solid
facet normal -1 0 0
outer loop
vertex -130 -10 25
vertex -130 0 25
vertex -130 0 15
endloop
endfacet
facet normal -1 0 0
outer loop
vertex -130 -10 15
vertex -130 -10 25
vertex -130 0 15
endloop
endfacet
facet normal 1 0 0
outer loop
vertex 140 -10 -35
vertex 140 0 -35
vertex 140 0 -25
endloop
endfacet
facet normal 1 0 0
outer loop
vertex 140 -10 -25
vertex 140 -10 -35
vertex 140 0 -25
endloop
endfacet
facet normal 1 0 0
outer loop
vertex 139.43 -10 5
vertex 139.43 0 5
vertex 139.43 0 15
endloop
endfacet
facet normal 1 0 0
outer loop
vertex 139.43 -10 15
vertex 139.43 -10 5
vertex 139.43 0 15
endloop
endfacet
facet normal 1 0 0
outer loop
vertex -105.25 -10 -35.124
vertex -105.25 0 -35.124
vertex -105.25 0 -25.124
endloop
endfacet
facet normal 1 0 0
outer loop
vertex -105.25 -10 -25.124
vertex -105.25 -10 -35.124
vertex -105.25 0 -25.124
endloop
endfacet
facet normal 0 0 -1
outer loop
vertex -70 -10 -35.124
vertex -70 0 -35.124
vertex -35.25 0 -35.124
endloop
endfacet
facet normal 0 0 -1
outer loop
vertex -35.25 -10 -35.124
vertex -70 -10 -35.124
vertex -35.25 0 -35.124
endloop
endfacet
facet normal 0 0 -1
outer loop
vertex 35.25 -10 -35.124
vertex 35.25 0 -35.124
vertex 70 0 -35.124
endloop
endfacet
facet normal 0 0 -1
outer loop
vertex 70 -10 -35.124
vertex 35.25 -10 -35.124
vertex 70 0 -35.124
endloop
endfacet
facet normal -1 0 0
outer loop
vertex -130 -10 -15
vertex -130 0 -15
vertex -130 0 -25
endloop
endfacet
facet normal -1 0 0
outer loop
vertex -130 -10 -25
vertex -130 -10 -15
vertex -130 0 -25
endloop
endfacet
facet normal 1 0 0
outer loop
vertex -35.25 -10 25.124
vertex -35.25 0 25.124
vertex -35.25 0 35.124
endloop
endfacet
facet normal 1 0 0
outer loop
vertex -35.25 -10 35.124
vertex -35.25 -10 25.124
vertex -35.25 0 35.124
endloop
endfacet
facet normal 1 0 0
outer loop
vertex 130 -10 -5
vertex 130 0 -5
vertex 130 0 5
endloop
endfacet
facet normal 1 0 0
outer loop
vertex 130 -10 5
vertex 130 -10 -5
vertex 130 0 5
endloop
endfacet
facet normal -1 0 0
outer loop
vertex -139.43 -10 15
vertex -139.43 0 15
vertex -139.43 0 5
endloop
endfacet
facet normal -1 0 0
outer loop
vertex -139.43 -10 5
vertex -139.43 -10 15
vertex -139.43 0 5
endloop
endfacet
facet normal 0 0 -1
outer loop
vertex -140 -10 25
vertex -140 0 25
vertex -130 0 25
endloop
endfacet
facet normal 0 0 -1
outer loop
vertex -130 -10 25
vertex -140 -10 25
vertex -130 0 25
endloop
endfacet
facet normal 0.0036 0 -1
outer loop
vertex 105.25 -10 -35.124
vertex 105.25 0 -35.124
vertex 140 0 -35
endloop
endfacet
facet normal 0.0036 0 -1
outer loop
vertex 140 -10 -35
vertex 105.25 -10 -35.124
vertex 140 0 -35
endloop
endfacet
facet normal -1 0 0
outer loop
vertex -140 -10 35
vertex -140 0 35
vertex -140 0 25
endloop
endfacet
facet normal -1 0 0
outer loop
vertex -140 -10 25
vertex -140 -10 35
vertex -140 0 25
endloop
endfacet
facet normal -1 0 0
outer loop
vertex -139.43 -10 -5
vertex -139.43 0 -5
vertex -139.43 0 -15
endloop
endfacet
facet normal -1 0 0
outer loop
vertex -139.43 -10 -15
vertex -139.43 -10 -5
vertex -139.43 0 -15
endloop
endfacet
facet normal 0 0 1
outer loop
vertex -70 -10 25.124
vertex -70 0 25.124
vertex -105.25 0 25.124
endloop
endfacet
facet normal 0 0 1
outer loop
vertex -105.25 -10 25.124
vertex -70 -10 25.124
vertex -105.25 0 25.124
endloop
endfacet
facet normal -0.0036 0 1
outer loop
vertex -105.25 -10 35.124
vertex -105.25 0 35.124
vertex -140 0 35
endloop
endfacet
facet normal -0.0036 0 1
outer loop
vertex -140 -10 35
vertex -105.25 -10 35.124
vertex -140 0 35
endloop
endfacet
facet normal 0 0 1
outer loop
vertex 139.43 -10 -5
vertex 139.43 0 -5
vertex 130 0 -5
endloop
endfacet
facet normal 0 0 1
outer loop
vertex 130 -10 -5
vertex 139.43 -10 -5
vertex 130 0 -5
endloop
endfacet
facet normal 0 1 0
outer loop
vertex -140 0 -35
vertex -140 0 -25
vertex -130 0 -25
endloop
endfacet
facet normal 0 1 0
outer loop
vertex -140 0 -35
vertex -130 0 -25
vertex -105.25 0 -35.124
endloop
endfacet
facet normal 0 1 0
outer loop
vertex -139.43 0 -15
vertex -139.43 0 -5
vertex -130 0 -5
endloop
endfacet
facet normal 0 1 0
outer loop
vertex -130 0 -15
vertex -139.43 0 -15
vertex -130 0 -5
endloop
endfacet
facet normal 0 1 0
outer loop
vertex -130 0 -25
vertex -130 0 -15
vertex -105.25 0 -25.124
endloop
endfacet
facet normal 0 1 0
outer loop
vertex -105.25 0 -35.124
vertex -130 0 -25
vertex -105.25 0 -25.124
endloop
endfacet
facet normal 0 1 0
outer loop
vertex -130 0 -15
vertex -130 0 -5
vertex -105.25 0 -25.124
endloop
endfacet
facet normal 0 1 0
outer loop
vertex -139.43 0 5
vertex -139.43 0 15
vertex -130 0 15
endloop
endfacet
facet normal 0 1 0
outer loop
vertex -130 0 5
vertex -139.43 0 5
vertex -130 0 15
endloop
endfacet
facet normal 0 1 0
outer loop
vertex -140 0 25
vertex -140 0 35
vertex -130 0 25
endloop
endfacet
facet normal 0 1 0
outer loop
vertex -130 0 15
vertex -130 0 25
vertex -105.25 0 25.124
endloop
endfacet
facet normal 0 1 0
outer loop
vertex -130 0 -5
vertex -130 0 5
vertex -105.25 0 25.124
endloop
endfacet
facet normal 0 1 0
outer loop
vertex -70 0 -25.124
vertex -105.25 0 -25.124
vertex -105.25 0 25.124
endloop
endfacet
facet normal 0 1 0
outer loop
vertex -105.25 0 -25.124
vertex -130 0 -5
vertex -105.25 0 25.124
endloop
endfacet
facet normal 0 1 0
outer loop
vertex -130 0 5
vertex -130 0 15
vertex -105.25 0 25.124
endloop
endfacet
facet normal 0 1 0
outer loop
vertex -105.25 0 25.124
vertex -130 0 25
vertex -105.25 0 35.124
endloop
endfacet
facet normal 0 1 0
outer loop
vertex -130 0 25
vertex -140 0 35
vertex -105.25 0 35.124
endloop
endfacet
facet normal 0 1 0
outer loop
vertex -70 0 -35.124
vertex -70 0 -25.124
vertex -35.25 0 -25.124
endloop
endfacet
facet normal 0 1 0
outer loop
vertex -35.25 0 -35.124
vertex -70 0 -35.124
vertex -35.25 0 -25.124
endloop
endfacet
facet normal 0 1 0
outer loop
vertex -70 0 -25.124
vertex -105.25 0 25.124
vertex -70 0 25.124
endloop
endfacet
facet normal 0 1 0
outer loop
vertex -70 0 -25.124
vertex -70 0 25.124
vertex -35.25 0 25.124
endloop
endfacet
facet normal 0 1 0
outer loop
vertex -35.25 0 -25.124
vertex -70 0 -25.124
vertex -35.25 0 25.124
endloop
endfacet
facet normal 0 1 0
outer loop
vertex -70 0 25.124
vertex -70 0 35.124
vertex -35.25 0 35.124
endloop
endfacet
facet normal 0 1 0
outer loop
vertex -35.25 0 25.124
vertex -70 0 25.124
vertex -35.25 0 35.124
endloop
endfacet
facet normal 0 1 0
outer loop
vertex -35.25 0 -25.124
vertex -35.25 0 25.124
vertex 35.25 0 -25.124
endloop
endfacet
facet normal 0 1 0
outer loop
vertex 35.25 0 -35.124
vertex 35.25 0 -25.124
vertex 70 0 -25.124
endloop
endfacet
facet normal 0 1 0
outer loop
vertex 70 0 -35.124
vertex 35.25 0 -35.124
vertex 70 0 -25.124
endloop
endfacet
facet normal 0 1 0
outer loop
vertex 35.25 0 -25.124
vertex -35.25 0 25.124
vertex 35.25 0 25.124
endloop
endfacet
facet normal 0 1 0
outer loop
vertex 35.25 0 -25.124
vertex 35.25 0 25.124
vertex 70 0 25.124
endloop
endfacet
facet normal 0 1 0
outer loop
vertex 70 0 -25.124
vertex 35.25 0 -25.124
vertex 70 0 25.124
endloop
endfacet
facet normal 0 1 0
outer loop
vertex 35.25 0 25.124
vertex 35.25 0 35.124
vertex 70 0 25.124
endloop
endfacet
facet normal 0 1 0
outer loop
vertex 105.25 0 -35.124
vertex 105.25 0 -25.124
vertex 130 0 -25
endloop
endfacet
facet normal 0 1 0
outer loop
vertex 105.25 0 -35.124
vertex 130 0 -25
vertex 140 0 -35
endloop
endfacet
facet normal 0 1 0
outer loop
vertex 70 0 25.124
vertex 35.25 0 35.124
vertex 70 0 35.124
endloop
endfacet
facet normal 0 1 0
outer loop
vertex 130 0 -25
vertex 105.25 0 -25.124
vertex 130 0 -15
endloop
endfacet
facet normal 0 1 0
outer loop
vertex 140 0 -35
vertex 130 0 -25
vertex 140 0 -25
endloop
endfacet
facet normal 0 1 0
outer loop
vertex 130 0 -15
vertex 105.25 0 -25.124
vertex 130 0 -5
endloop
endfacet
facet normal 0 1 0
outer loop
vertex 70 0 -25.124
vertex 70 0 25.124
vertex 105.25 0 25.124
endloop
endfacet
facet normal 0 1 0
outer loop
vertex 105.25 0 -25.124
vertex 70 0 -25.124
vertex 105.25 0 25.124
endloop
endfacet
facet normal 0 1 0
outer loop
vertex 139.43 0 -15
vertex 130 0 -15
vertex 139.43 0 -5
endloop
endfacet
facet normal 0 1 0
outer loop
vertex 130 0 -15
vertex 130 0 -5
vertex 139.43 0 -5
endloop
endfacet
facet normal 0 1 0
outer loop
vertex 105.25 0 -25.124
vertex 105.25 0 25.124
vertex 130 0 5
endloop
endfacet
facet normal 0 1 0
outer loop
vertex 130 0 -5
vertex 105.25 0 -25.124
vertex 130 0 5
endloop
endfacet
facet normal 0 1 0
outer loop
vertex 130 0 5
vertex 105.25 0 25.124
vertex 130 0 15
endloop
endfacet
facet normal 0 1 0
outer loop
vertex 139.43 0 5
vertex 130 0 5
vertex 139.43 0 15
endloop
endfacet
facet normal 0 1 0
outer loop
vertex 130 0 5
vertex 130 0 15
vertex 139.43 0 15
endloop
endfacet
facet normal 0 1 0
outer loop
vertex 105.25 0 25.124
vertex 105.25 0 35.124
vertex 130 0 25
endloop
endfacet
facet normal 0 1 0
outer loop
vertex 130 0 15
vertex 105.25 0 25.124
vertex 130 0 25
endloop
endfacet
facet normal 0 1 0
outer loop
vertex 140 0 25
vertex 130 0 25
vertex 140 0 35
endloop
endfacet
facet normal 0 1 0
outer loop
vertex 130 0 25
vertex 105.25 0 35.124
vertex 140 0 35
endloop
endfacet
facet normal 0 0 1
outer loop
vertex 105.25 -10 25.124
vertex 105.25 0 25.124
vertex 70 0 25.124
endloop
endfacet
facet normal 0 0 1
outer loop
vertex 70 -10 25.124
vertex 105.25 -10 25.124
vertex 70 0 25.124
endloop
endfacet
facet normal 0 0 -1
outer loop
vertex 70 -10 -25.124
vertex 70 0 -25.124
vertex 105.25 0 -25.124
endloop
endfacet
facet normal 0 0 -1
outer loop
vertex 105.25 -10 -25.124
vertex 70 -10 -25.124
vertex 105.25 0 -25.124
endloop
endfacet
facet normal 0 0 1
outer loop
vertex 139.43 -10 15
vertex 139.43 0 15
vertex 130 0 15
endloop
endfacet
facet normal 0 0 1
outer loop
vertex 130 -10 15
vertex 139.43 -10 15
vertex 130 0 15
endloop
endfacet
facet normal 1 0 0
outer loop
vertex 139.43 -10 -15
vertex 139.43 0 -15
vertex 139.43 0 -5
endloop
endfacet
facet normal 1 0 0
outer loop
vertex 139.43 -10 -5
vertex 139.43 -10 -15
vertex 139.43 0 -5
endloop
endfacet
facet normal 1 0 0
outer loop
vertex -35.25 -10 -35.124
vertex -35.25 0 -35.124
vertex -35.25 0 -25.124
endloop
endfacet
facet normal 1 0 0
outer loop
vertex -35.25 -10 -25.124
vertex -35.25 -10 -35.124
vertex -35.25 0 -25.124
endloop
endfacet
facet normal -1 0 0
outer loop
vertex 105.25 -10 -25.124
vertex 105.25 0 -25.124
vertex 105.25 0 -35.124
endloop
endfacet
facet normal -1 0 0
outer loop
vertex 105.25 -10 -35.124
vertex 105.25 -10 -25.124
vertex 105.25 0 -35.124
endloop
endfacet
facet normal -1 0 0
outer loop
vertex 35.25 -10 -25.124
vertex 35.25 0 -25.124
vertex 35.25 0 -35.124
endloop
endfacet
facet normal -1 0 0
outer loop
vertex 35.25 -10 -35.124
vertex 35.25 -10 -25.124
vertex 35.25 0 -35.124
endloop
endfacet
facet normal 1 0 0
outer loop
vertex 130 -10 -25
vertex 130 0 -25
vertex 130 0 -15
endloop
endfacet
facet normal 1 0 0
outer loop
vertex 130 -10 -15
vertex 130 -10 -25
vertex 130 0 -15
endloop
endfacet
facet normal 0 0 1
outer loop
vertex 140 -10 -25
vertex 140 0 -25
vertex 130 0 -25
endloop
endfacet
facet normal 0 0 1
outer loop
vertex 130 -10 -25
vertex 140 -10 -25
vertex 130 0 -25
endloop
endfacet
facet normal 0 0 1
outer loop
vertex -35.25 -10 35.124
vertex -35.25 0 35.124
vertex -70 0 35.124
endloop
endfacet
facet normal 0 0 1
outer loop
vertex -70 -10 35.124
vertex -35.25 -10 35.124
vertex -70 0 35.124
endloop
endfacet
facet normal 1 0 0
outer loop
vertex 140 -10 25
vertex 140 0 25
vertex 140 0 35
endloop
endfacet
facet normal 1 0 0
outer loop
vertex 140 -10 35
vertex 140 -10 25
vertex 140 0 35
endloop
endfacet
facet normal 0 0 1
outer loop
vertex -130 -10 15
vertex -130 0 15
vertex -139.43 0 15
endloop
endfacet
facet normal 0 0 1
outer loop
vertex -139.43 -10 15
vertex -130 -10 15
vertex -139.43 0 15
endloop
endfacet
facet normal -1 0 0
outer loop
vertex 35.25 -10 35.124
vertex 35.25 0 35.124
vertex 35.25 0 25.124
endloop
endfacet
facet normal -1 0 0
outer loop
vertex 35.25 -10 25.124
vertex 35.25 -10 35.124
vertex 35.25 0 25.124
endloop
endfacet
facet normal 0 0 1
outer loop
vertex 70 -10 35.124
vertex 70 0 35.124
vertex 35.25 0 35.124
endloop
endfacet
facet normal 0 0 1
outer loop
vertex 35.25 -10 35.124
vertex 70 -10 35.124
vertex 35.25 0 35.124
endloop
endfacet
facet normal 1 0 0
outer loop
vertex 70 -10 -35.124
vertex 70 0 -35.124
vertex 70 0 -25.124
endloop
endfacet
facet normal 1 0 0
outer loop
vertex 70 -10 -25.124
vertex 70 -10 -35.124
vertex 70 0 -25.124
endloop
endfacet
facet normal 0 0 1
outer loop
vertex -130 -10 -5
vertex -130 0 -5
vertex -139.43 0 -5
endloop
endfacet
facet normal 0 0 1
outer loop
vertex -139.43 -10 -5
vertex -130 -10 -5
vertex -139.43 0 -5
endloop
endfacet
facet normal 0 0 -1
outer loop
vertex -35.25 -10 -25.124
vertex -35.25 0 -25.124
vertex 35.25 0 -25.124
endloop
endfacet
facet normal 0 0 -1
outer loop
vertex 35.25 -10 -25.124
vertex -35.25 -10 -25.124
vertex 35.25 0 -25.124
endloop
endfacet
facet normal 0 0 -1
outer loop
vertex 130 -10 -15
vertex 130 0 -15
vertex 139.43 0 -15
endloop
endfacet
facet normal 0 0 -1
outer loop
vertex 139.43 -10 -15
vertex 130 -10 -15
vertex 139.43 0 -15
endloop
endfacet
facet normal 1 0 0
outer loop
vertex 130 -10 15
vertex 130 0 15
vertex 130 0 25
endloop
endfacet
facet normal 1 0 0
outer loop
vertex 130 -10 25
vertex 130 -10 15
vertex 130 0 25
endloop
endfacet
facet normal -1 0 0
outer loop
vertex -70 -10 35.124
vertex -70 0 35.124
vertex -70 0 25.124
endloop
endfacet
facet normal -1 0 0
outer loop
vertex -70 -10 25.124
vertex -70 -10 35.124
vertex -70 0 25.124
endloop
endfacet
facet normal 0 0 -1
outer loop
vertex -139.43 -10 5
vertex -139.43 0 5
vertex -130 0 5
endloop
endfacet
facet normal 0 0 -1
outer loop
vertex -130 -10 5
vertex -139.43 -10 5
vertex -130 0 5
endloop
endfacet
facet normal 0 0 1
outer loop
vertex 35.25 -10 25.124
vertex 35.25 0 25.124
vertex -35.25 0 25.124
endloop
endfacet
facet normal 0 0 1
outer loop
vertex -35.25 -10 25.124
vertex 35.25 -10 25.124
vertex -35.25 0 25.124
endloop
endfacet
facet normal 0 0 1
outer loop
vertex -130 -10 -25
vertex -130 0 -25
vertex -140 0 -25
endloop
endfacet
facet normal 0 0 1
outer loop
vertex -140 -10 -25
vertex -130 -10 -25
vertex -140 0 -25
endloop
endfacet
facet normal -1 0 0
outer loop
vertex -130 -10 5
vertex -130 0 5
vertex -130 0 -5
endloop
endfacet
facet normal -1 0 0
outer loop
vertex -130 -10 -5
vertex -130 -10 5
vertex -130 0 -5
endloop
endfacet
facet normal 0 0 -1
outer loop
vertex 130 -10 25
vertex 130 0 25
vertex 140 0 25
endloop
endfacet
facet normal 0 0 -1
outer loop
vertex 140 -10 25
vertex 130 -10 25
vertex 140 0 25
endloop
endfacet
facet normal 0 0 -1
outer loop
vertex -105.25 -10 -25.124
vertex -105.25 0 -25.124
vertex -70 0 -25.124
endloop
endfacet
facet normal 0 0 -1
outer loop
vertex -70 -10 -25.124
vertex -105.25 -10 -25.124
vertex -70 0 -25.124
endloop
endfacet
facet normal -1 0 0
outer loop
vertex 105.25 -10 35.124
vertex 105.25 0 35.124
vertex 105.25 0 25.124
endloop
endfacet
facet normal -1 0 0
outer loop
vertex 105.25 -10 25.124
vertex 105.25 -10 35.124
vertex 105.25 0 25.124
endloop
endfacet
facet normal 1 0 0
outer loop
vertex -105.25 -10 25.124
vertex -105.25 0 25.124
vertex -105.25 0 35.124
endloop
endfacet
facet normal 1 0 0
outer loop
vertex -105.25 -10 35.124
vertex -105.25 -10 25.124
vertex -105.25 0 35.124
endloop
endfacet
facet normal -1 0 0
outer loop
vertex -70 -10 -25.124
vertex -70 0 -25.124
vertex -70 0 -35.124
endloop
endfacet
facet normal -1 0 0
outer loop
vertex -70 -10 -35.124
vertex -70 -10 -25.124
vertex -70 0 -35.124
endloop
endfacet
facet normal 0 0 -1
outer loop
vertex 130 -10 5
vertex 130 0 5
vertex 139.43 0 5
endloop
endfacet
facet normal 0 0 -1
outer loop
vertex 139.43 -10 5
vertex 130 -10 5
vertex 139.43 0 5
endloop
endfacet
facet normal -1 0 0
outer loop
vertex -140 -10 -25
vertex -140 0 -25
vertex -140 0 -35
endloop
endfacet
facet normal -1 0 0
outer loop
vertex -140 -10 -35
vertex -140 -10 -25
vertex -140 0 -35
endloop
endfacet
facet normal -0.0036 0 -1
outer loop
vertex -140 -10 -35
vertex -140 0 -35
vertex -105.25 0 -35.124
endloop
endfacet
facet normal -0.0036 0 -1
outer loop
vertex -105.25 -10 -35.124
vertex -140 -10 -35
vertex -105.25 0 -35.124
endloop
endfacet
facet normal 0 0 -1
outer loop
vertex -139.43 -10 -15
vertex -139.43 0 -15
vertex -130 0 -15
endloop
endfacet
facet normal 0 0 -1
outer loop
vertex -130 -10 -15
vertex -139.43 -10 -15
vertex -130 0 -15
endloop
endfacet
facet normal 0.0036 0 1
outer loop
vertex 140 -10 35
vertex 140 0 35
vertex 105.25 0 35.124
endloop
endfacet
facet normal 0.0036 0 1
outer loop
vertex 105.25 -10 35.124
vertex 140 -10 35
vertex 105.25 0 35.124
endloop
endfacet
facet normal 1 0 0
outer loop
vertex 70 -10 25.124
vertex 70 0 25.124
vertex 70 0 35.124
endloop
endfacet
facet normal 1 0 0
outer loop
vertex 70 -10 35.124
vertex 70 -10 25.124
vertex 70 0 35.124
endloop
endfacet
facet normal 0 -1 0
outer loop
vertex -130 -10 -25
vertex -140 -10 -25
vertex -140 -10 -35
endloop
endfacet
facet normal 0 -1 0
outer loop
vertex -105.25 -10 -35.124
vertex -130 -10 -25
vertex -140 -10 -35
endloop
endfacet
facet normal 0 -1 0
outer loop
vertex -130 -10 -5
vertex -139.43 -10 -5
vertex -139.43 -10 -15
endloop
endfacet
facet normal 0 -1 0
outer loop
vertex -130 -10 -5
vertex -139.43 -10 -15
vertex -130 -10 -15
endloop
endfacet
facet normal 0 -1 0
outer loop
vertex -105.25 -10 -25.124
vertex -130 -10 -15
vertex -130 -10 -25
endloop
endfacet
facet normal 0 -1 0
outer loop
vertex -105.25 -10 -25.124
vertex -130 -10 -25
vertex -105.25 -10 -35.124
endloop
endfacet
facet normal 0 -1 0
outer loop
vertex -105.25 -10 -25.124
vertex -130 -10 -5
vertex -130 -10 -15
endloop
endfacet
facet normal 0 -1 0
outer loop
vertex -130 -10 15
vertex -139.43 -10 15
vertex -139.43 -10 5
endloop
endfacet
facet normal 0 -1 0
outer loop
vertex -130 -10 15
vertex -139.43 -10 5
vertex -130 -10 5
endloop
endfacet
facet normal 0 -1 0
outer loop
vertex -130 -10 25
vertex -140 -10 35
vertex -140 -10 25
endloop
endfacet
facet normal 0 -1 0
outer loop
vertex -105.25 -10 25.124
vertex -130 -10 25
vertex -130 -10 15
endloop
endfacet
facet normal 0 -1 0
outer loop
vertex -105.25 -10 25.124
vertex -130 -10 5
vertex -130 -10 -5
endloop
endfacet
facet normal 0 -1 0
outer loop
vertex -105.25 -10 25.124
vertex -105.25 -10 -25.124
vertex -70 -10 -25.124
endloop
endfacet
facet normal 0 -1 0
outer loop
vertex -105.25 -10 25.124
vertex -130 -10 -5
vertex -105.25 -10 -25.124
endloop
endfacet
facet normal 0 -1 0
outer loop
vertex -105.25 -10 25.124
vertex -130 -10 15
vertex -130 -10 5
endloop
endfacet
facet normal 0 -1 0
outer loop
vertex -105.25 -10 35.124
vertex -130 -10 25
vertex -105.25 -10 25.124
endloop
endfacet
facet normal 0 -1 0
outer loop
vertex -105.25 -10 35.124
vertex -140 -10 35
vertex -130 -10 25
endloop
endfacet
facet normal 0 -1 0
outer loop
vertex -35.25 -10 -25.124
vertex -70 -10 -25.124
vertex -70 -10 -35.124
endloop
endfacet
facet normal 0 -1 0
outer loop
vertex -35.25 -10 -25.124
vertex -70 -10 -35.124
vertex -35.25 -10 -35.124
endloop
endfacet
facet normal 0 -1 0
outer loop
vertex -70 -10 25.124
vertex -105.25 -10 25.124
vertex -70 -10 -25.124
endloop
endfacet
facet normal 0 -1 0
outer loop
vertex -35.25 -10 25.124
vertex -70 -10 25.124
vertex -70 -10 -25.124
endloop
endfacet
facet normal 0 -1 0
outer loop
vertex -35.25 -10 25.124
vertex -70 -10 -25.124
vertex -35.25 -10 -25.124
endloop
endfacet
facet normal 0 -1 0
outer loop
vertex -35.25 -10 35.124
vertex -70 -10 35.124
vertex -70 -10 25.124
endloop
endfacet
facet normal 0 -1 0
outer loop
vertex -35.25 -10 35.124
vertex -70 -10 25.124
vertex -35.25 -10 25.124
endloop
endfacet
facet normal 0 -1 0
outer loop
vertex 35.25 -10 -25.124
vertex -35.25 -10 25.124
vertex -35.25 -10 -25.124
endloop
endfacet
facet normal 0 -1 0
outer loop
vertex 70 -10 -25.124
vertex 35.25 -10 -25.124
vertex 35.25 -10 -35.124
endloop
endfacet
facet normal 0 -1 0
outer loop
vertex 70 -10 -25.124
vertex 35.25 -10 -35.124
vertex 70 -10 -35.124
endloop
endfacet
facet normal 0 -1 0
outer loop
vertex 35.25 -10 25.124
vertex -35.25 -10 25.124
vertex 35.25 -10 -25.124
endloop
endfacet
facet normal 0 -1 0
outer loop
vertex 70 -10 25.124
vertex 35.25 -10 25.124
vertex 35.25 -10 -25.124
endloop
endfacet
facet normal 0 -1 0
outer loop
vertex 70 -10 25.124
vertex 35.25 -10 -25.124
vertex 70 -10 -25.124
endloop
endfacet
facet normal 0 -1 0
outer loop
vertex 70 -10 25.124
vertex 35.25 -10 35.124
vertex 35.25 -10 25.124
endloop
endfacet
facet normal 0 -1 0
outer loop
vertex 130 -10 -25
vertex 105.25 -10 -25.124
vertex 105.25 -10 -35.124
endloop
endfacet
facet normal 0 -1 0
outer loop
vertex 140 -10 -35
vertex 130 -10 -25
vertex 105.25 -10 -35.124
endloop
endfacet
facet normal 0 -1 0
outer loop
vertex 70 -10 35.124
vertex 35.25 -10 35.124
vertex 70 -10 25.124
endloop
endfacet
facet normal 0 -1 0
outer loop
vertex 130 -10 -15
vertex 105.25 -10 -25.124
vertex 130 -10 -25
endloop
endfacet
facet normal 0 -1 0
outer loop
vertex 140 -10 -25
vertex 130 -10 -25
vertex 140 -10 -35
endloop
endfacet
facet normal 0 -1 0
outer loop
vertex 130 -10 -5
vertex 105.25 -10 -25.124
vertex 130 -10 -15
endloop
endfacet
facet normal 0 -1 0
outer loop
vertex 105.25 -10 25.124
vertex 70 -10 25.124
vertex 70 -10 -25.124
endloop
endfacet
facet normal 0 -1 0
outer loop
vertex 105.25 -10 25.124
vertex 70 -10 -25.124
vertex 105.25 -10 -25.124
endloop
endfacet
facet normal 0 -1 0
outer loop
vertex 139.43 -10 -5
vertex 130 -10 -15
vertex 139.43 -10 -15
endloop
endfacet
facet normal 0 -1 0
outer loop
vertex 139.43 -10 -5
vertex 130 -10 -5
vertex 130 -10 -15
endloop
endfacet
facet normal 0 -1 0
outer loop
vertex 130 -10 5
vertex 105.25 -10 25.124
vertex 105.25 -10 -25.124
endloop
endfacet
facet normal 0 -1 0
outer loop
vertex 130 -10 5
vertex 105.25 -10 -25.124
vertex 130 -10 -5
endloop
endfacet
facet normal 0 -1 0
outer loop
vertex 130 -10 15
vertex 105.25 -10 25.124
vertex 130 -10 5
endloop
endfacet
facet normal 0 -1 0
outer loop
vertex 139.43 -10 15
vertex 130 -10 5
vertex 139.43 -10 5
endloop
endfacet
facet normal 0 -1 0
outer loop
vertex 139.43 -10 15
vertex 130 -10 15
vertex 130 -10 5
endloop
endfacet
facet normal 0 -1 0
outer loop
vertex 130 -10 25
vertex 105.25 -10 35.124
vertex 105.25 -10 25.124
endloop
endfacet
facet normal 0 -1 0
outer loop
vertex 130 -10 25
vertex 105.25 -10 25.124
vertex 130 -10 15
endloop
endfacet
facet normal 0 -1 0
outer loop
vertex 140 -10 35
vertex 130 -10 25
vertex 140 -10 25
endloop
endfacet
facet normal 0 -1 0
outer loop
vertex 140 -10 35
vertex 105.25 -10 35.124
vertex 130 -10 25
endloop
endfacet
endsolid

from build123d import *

# Parameters (mm, degrees)
F1_DEPTH = 10


with BuildPart() as f1:
    # F0 (on Front) → F1 (new body)
    with BuildSketch(Plane.XZ):
        Polygon((105.25, -35.124361), (140, -35), (140, -25), (130, -25), (130, -15), (139.429527, -15), (139.429527, -5), (130, -5), (130, 5), (139.429527, 5), (139.429527, 15), (130, 15), (130, 25), (140, 25), (140, 35), (105.25, 35.124361), (105.25, 25.124361), (70, 25.124361), (70, 35.124361), (35.25, 35.124361), (35.25, 25.124361), (0, 25.124361), (-35.25, 25.124361), (-35.25, 35.124361), (-70, 35.124361), (-70, 25.124361), (-105.25, 25.124361), (-105.25, 35.124361), (-140, 35), (-140, 25), (-130, 25), (-130, 15), (-139.429527, 15), (-139.429527, 5), (-130, 5), (-130, -5), (-139.429527, -5), (-139.429527, -15), (-130, -15), (-130, -25), (-140, -25), (-140, -35), (-105.25, -35.124361), (-105.25, -25.124361), (-70, -25.124361), (-70, -35.124361), (-35.25, -35.124361), (-35.25, -25.124361), (0, -25.124361), (35.25, -25.124361), (35.25, -35.124361), (70, -35.124361), (70, -25.124361), (105.25, -25.124361), align=None)
    extrude(amount=F1_DEPTH)


solid = f1.part
